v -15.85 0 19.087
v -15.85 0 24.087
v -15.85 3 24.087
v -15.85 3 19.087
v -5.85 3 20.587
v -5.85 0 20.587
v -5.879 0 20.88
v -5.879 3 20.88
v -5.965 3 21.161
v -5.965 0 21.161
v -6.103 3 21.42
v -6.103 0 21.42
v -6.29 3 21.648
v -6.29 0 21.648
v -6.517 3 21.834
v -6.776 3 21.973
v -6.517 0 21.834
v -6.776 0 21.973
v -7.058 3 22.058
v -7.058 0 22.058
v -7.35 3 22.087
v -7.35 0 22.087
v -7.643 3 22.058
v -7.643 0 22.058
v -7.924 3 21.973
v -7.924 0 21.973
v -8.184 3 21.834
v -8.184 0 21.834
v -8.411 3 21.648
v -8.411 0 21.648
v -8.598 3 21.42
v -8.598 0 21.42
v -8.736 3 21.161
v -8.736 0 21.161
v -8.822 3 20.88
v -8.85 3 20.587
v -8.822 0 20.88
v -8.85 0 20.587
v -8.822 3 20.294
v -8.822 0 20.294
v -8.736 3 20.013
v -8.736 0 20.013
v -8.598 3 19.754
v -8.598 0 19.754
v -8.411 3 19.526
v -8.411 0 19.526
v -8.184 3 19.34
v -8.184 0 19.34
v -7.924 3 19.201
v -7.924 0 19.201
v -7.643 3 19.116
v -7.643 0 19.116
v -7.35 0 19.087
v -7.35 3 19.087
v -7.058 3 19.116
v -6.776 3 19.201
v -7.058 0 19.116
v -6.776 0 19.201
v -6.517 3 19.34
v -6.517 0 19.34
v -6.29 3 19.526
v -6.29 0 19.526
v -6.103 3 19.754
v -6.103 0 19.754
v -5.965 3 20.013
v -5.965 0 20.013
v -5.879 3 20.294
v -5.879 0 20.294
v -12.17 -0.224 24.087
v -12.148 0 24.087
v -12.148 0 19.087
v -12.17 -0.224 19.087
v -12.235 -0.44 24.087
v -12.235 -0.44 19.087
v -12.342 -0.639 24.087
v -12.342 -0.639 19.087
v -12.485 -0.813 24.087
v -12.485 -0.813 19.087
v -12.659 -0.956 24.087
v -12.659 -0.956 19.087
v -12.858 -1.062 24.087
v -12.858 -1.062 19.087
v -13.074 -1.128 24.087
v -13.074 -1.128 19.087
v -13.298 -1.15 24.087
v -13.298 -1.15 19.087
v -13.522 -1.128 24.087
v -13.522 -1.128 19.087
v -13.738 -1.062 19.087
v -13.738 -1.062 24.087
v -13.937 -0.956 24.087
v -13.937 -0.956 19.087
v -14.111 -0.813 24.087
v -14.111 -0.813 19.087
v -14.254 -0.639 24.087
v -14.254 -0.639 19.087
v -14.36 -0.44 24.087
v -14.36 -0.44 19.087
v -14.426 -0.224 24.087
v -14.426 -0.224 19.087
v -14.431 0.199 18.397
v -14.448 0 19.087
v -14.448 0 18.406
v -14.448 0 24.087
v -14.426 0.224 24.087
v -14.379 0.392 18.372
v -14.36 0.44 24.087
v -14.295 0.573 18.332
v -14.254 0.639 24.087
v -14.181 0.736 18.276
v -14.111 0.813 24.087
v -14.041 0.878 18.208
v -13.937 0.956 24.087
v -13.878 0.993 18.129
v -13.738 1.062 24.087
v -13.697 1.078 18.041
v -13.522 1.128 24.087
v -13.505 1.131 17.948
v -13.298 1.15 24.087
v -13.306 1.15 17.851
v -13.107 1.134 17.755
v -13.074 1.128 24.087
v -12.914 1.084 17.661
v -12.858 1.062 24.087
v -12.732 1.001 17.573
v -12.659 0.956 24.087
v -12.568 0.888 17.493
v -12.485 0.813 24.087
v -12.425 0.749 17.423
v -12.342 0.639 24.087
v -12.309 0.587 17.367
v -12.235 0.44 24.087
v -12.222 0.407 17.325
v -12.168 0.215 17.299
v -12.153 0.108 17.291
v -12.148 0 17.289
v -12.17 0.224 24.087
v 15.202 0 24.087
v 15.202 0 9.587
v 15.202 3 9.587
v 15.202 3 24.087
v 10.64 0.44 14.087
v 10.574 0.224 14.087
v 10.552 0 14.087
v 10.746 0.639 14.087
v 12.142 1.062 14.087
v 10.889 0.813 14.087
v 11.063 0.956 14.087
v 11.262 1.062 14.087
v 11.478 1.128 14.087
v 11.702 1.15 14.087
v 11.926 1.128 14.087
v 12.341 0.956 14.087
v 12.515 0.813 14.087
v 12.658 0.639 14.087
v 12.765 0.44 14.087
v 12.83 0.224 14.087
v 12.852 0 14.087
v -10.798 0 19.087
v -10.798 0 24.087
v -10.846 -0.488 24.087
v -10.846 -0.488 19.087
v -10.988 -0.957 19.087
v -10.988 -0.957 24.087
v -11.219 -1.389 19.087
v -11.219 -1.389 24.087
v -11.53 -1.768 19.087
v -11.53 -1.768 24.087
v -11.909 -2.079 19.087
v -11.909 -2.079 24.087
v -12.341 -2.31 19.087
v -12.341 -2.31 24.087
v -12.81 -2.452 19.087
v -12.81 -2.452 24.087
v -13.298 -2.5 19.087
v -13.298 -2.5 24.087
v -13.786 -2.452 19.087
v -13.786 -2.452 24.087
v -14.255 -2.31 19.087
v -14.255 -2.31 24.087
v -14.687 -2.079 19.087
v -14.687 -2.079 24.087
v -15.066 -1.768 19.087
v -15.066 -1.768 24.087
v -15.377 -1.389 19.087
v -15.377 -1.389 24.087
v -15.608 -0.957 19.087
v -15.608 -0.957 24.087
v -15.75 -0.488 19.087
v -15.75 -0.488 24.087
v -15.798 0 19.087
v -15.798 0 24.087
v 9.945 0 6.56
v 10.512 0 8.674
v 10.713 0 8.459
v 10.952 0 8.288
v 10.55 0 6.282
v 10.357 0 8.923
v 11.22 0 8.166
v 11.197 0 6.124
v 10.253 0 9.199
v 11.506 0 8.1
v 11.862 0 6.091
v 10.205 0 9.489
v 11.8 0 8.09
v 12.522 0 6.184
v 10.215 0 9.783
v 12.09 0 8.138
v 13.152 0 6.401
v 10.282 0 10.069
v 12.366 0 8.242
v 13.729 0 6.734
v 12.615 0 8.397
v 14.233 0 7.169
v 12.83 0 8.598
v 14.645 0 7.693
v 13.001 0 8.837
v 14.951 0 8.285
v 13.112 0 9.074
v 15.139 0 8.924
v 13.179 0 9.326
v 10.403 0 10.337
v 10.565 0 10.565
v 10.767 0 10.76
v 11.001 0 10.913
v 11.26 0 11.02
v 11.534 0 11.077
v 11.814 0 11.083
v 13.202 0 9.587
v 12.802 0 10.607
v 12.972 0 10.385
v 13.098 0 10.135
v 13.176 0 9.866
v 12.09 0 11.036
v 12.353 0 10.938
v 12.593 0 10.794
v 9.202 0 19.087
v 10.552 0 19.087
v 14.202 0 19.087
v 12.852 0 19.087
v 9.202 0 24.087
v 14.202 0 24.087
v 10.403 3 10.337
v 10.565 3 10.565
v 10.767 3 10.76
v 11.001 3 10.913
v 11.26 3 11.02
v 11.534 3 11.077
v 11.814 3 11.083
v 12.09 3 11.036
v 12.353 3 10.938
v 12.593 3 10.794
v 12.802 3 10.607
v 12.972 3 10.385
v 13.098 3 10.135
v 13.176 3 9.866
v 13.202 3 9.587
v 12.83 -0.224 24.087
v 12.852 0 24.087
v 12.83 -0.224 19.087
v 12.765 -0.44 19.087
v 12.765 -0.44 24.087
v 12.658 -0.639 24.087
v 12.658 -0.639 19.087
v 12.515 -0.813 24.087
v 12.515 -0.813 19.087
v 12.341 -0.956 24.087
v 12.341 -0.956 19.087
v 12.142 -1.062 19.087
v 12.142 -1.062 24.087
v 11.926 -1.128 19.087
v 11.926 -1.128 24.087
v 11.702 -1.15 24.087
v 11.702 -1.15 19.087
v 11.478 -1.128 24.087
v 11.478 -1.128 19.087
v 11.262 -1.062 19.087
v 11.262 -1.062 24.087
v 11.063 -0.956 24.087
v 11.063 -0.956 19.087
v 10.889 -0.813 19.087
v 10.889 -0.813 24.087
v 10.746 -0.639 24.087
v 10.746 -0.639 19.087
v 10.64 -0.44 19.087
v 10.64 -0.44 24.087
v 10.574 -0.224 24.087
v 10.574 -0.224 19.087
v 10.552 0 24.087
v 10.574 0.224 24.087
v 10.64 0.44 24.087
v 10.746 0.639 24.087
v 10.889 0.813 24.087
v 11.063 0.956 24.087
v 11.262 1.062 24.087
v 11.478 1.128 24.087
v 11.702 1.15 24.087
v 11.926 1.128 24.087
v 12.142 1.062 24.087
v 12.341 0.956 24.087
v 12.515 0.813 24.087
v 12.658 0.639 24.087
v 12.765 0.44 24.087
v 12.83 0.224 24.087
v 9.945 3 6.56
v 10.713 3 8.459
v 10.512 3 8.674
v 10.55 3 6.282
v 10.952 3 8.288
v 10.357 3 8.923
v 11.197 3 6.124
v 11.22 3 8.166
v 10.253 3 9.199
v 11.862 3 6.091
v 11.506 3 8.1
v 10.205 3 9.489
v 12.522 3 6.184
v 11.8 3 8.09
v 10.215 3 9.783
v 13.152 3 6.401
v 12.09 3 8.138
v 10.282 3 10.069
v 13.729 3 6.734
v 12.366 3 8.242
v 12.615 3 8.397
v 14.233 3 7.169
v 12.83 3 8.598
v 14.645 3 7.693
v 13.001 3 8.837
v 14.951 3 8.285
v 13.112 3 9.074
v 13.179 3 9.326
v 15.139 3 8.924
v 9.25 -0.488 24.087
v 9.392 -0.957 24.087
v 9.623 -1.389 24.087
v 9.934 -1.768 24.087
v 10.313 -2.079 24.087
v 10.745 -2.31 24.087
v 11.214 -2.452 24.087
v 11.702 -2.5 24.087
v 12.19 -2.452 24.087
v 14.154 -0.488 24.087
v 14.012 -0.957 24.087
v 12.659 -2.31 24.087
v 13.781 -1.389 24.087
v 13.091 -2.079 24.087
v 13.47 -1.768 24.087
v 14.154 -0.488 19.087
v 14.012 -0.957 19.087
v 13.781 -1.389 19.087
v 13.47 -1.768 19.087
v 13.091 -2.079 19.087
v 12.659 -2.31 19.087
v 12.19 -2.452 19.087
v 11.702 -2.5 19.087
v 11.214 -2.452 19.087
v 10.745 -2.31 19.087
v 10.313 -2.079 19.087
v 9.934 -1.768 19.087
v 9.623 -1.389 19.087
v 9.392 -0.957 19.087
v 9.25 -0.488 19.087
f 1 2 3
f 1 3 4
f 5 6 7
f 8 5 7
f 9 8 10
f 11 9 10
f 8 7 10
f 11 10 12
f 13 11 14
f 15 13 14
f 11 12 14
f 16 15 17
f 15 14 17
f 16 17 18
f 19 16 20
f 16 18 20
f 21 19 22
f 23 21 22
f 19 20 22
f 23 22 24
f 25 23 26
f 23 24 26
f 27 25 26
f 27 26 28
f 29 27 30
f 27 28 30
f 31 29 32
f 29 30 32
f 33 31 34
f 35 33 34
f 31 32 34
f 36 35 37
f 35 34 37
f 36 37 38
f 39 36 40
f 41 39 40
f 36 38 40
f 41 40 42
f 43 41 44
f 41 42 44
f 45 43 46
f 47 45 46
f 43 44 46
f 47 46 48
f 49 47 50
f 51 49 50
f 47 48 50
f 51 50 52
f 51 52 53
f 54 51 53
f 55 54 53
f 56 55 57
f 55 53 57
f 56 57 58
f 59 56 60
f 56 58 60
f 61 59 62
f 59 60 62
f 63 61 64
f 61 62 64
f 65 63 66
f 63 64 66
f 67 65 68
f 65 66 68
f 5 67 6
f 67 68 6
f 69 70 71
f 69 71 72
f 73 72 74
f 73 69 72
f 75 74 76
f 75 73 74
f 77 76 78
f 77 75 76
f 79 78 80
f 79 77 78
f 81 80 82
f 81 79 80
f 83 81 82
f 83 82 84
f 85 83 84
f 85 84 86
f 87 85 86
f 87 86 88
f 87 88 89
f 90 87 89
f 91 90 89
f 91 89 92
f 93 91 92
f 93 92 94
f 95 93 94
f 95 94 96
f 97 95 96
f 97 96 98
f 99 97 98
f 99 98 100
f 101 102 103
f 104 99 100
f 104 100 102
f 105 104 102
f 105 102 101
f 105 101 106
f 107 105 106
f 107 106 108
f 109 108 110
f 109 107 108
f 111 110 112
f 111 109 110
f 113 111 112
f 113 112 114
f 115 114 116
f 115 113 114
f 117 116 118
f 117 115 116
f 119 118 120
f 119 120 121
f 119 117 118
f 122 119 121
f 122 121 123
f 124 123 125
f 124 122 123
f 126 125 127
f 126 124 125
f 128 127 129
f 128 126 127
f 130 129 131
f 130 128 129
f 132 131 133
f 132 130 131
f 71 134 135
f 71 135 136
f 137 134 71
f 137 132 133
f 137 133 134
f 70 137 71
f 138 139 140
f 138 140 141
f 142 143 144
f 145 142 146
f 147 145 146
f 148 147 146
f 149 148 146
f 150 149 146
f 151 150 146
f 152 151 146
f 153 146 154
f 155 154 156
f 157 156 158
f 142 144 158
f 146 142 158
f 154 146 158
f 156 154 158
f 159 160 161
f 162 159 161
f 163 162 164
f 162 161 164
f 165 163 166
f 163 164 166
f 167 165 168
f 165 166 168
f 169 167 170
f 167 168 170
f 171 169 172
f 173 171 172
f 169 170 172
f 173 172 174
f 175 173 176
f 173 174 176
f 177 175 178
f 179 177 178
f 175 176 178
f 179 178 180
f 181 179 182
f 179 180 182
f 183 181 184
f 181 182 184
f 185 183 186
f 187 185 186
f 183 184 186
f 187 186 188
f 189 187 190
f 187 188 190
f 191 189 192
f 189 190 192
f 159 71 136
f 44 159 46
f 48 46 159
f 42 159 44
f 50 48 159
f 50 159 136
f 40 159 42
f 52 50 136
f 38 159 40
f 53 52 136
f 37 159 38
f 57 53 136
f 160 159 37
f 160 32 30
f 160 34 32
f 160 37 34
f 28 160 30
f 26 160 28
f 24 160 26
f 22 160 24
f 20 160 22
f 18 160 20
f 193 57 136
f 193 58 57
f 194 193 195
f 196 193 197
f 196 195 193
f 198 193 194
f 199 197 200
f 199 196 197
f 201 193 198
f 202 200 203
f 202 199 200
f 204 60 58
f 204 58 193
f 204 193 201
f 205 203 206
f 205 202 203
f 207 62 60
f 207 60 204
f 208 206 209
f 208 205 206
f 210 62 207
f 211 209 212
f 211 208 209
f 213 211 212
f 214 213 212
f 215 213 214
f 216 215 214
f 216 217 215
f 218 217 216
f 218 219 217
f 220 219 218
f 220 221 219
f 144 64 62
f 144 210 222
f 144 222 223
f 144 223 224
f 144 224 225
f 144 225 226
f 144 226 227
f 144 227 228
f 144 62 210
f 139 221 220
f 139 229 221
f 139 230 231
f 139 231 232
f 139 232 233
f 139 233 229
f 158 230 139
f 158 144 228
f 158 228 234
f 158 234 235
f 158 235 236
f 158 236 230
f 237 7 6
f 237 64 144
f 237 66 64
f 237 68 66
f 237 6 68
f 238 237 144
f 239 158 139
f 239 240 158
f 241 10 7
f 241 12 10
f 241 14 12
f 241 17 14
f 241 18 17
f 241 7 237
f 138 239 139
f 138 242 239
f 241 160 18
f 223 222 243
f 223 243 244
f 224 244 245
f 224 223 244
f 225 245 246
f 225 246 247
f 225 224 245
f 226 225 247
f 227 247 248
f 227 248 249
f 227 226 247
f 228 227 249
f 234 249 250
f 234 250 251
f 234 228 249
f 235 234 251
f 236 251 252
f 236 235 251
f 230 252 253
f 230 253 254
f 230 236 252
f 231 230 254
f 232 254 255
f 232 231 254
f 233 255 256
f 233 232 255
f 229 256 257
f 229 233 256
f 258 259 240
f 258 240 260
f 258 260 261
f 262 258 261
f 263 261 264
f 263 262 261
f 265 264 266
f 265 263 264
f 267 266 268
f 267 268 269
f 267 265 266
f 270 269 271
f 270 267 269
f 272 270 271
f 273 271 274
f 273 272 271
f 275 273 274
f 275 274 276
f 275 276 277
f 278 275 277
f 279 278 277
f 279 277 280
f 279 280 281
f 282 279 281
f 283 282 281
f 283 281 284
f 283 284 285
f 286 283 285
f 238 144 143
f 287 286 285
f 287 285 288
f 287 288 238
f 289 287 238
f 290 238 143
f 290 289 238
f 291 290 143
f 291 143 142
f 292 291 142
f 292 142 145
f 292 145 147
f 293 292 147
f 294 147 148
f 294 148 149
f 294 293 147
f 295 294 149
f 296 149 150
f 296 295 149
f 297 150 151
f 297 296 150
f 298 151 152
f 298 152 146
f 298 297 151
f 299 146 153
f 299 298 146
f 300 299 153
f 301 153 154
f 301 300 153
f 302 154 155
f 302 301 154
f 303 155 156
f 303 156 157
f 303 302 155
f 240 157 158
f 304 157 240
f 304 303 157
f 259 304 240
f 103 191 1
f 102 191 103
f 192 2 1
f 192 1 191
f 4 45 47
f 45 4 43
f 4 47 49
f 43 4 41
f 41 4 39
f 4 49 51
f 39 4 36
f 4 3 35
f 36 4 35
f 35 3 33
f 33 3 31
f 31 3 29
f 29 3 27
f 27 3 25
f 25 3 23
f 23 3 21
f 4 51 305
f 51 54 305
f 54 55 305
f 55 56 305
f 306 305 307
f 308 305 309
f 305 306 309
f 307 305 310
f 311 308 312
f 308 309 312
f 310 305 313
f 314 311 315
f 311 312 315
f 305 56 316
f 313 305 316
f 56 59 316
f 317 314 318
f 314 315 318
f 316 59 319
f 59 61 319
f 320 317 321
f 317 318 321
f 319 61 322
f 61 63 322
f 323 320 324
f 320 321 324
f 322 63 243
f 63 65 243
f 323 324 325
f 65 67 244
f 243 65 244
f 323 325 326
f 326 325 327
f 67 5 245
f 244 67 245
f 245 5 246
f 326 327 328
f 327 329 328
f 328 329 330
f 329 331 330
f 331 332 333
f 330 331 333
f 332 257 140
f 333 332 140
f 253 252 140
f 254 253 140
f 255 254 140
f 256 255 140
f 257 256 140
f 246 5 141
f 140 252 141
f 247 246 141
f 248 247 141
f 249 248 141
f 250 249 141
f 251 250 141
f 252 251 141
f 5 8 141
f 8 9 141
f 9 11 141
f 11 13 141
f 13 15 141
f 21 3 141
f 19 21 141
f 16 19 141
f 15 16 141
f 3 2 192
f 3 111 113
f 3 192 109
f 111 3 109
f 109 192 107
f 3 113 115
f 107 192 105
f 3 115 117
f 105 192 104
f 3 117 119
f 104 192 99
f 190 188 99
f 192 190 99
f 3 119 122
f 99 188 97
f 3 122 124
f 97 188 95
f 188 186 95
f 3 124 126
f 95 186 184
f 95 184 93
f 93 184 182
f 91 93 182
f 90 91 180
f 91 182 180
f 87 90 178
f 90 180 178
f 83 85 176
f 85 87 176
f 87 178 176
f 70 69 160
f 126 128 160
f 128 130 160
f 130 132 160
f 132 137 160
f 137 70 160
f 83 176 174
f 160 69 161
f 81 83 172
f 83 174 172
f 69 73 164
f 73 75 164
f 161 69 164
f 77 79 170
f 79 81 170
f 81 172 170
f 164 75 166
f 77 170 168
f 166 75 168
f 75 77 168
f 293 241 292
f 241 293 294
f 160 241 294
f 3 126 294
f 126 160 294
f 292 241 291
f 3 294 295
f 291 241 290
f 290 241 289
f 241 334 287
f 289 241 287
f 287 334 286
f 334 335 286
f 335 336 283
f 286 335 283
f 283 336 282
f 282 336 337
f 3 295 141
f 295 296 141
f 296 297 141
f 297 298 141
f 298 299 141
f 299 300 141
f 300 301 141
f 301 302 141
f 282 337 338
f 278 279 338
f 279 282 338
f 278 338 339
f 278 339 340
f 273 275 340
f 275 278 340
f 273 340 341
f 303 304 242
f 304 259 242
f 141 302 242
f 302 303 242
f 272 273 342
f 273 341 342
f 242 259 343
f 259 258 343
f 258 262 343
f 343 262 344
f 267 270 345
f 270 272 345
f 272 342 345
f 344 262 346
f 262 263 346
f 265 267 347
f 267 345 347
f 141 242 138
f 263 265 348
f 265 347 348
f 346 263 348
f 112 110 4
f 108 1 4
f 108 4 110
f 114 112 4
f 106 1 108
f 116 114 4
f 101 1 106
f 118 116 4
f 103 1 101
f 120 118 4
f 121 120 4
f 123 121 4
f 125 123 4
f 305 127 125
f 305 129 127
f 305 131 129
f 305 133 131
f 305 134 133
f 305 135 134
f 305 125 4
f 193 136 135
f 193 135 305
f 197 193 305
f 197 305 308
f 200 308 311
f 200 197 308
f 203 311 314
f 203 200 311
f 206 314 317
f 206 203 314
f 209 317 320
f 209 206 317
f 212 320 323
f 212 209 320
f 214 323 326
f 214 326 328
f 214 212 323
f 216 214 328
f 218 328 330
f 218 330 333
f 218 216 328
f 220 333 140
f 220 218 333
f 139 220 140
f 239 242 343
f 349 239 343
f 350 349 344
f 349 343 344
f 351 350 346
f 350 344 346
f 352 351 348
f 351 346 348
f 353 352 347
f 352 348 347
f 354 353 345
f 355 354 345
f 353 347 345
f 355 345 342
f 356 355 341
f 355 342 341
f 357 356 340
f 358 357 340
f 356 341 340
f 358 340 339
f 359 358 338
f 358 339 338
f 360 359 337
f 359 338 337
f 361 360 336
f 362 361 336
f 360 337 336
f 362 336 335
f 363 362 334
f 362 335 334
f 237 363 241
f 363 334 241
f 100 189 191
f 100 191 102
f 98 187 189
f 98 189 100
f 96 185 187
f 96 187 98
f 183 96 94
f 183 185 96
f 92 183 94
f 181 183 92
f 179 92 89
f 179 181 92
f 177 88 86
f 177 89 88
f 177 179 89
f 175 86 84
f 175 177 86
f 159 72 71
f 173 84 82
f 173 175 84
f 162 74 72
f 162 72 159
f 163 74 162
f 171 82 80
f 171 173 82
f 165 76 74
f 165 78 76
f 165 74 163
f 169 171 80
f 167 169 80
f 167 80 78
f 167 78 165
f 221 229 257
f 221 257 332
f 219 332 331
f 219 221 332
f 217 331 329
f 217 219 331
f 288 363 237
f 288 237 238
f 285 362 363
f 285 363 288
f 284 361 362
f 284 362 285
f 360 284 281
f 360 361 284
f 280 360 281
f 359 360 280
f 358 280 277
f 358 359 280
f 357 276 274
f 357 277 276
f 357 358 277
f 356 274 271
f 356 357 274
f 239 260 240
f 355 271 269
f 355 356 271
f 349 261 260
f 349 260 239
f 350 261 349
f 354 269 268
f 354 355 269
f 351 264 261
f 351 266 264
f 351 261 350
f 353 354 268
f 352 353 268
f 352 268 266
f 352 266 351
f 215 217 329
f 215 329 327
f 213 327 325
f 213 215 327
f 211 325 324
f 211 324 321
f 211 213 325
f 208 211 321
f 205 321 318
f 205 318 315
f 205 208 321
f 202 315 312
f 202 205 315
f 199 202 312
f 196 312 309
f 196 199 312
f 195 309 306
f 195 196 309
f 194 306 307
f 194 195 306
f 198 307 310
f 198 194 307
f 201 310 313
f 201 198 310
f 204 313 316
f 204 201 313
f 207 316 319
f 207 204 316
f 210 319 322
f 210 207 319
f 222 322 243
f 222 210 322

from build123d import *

# Parameters (mm, degrees)
F0_R     = 1.5
F1_DEPTH = 3
F2_R     = 2.5
F3_DEPTH = 5
F4_R     = 1.15
F5_DEPTH = 10


with BuildPart() as f1:
    # F0 (on Front) → F1 (new body)
    with BuildSketch(Plane.XZ):
        with BuildLine():
            Line((-15.850437, 19.086891), (9.944777, 6.560055))
            ThreePointArc((9.944777, 6.560055), (13.448446, 6.553682), (15.202122, 9.586891))
            Line((15.202122, 9.586891), (15.202122, 24.086891))
            Line((15.202122, 24.086891), (-10.850437, 24.086891))
            Line((-10.850437, 24.086891), (-15.850437, 24.086891))
            Line((-15.850437, 24.086891), (-15.850437, 19.086891))
        make_face()
        with BuildLine():
            ThreePointArc((13.00116, 8.836891), (10.952122, 8.287853), (10.403084, 10.336891))
            ThreePointArc((10.403084, 10.336891), (12.090351, 11.035779), (13.202122, 9.586891))
            ThreePointArc((13.202122, 9.586891), (13.151011, 9.198662), (13.00116, 8.836891))
        make_face(mode=Mode.SUBTRACT)
        with Locations((-7.350437, 20.586891)):
            Circle(F0_R, mode=Mode.SUBTRACT)
    extrude(amount=F1_DEPTH)

    # F2 (on face) → F3 (join)
    with BuildSketch(Plane.XY.offset(24.086891)):
        with Locations((11.702122, 0)):
            Circle(F2_R)
        with Locations((-13.297878, 0)):
            Circle(F2_R)
    extrude(amount=-F3_DEPTH)

    # F4 (on face) → F5 (cut)
    with BuildSketch(Plane.XY.offset(24.086891)):
        with Locations((11.702122, 0)):
            Circle(F4_R)
        with Locations((-13.297878, 0)):
            Circle(F4_R)
    extrude(amount=-F5_DEPTH, mode=Mode.SUBTRACT)


with BuildPart() as f6_1:
    # F6: instance of F1
    add(f1.part.mirror(Plane.XZ))


solid = f6_1.part
